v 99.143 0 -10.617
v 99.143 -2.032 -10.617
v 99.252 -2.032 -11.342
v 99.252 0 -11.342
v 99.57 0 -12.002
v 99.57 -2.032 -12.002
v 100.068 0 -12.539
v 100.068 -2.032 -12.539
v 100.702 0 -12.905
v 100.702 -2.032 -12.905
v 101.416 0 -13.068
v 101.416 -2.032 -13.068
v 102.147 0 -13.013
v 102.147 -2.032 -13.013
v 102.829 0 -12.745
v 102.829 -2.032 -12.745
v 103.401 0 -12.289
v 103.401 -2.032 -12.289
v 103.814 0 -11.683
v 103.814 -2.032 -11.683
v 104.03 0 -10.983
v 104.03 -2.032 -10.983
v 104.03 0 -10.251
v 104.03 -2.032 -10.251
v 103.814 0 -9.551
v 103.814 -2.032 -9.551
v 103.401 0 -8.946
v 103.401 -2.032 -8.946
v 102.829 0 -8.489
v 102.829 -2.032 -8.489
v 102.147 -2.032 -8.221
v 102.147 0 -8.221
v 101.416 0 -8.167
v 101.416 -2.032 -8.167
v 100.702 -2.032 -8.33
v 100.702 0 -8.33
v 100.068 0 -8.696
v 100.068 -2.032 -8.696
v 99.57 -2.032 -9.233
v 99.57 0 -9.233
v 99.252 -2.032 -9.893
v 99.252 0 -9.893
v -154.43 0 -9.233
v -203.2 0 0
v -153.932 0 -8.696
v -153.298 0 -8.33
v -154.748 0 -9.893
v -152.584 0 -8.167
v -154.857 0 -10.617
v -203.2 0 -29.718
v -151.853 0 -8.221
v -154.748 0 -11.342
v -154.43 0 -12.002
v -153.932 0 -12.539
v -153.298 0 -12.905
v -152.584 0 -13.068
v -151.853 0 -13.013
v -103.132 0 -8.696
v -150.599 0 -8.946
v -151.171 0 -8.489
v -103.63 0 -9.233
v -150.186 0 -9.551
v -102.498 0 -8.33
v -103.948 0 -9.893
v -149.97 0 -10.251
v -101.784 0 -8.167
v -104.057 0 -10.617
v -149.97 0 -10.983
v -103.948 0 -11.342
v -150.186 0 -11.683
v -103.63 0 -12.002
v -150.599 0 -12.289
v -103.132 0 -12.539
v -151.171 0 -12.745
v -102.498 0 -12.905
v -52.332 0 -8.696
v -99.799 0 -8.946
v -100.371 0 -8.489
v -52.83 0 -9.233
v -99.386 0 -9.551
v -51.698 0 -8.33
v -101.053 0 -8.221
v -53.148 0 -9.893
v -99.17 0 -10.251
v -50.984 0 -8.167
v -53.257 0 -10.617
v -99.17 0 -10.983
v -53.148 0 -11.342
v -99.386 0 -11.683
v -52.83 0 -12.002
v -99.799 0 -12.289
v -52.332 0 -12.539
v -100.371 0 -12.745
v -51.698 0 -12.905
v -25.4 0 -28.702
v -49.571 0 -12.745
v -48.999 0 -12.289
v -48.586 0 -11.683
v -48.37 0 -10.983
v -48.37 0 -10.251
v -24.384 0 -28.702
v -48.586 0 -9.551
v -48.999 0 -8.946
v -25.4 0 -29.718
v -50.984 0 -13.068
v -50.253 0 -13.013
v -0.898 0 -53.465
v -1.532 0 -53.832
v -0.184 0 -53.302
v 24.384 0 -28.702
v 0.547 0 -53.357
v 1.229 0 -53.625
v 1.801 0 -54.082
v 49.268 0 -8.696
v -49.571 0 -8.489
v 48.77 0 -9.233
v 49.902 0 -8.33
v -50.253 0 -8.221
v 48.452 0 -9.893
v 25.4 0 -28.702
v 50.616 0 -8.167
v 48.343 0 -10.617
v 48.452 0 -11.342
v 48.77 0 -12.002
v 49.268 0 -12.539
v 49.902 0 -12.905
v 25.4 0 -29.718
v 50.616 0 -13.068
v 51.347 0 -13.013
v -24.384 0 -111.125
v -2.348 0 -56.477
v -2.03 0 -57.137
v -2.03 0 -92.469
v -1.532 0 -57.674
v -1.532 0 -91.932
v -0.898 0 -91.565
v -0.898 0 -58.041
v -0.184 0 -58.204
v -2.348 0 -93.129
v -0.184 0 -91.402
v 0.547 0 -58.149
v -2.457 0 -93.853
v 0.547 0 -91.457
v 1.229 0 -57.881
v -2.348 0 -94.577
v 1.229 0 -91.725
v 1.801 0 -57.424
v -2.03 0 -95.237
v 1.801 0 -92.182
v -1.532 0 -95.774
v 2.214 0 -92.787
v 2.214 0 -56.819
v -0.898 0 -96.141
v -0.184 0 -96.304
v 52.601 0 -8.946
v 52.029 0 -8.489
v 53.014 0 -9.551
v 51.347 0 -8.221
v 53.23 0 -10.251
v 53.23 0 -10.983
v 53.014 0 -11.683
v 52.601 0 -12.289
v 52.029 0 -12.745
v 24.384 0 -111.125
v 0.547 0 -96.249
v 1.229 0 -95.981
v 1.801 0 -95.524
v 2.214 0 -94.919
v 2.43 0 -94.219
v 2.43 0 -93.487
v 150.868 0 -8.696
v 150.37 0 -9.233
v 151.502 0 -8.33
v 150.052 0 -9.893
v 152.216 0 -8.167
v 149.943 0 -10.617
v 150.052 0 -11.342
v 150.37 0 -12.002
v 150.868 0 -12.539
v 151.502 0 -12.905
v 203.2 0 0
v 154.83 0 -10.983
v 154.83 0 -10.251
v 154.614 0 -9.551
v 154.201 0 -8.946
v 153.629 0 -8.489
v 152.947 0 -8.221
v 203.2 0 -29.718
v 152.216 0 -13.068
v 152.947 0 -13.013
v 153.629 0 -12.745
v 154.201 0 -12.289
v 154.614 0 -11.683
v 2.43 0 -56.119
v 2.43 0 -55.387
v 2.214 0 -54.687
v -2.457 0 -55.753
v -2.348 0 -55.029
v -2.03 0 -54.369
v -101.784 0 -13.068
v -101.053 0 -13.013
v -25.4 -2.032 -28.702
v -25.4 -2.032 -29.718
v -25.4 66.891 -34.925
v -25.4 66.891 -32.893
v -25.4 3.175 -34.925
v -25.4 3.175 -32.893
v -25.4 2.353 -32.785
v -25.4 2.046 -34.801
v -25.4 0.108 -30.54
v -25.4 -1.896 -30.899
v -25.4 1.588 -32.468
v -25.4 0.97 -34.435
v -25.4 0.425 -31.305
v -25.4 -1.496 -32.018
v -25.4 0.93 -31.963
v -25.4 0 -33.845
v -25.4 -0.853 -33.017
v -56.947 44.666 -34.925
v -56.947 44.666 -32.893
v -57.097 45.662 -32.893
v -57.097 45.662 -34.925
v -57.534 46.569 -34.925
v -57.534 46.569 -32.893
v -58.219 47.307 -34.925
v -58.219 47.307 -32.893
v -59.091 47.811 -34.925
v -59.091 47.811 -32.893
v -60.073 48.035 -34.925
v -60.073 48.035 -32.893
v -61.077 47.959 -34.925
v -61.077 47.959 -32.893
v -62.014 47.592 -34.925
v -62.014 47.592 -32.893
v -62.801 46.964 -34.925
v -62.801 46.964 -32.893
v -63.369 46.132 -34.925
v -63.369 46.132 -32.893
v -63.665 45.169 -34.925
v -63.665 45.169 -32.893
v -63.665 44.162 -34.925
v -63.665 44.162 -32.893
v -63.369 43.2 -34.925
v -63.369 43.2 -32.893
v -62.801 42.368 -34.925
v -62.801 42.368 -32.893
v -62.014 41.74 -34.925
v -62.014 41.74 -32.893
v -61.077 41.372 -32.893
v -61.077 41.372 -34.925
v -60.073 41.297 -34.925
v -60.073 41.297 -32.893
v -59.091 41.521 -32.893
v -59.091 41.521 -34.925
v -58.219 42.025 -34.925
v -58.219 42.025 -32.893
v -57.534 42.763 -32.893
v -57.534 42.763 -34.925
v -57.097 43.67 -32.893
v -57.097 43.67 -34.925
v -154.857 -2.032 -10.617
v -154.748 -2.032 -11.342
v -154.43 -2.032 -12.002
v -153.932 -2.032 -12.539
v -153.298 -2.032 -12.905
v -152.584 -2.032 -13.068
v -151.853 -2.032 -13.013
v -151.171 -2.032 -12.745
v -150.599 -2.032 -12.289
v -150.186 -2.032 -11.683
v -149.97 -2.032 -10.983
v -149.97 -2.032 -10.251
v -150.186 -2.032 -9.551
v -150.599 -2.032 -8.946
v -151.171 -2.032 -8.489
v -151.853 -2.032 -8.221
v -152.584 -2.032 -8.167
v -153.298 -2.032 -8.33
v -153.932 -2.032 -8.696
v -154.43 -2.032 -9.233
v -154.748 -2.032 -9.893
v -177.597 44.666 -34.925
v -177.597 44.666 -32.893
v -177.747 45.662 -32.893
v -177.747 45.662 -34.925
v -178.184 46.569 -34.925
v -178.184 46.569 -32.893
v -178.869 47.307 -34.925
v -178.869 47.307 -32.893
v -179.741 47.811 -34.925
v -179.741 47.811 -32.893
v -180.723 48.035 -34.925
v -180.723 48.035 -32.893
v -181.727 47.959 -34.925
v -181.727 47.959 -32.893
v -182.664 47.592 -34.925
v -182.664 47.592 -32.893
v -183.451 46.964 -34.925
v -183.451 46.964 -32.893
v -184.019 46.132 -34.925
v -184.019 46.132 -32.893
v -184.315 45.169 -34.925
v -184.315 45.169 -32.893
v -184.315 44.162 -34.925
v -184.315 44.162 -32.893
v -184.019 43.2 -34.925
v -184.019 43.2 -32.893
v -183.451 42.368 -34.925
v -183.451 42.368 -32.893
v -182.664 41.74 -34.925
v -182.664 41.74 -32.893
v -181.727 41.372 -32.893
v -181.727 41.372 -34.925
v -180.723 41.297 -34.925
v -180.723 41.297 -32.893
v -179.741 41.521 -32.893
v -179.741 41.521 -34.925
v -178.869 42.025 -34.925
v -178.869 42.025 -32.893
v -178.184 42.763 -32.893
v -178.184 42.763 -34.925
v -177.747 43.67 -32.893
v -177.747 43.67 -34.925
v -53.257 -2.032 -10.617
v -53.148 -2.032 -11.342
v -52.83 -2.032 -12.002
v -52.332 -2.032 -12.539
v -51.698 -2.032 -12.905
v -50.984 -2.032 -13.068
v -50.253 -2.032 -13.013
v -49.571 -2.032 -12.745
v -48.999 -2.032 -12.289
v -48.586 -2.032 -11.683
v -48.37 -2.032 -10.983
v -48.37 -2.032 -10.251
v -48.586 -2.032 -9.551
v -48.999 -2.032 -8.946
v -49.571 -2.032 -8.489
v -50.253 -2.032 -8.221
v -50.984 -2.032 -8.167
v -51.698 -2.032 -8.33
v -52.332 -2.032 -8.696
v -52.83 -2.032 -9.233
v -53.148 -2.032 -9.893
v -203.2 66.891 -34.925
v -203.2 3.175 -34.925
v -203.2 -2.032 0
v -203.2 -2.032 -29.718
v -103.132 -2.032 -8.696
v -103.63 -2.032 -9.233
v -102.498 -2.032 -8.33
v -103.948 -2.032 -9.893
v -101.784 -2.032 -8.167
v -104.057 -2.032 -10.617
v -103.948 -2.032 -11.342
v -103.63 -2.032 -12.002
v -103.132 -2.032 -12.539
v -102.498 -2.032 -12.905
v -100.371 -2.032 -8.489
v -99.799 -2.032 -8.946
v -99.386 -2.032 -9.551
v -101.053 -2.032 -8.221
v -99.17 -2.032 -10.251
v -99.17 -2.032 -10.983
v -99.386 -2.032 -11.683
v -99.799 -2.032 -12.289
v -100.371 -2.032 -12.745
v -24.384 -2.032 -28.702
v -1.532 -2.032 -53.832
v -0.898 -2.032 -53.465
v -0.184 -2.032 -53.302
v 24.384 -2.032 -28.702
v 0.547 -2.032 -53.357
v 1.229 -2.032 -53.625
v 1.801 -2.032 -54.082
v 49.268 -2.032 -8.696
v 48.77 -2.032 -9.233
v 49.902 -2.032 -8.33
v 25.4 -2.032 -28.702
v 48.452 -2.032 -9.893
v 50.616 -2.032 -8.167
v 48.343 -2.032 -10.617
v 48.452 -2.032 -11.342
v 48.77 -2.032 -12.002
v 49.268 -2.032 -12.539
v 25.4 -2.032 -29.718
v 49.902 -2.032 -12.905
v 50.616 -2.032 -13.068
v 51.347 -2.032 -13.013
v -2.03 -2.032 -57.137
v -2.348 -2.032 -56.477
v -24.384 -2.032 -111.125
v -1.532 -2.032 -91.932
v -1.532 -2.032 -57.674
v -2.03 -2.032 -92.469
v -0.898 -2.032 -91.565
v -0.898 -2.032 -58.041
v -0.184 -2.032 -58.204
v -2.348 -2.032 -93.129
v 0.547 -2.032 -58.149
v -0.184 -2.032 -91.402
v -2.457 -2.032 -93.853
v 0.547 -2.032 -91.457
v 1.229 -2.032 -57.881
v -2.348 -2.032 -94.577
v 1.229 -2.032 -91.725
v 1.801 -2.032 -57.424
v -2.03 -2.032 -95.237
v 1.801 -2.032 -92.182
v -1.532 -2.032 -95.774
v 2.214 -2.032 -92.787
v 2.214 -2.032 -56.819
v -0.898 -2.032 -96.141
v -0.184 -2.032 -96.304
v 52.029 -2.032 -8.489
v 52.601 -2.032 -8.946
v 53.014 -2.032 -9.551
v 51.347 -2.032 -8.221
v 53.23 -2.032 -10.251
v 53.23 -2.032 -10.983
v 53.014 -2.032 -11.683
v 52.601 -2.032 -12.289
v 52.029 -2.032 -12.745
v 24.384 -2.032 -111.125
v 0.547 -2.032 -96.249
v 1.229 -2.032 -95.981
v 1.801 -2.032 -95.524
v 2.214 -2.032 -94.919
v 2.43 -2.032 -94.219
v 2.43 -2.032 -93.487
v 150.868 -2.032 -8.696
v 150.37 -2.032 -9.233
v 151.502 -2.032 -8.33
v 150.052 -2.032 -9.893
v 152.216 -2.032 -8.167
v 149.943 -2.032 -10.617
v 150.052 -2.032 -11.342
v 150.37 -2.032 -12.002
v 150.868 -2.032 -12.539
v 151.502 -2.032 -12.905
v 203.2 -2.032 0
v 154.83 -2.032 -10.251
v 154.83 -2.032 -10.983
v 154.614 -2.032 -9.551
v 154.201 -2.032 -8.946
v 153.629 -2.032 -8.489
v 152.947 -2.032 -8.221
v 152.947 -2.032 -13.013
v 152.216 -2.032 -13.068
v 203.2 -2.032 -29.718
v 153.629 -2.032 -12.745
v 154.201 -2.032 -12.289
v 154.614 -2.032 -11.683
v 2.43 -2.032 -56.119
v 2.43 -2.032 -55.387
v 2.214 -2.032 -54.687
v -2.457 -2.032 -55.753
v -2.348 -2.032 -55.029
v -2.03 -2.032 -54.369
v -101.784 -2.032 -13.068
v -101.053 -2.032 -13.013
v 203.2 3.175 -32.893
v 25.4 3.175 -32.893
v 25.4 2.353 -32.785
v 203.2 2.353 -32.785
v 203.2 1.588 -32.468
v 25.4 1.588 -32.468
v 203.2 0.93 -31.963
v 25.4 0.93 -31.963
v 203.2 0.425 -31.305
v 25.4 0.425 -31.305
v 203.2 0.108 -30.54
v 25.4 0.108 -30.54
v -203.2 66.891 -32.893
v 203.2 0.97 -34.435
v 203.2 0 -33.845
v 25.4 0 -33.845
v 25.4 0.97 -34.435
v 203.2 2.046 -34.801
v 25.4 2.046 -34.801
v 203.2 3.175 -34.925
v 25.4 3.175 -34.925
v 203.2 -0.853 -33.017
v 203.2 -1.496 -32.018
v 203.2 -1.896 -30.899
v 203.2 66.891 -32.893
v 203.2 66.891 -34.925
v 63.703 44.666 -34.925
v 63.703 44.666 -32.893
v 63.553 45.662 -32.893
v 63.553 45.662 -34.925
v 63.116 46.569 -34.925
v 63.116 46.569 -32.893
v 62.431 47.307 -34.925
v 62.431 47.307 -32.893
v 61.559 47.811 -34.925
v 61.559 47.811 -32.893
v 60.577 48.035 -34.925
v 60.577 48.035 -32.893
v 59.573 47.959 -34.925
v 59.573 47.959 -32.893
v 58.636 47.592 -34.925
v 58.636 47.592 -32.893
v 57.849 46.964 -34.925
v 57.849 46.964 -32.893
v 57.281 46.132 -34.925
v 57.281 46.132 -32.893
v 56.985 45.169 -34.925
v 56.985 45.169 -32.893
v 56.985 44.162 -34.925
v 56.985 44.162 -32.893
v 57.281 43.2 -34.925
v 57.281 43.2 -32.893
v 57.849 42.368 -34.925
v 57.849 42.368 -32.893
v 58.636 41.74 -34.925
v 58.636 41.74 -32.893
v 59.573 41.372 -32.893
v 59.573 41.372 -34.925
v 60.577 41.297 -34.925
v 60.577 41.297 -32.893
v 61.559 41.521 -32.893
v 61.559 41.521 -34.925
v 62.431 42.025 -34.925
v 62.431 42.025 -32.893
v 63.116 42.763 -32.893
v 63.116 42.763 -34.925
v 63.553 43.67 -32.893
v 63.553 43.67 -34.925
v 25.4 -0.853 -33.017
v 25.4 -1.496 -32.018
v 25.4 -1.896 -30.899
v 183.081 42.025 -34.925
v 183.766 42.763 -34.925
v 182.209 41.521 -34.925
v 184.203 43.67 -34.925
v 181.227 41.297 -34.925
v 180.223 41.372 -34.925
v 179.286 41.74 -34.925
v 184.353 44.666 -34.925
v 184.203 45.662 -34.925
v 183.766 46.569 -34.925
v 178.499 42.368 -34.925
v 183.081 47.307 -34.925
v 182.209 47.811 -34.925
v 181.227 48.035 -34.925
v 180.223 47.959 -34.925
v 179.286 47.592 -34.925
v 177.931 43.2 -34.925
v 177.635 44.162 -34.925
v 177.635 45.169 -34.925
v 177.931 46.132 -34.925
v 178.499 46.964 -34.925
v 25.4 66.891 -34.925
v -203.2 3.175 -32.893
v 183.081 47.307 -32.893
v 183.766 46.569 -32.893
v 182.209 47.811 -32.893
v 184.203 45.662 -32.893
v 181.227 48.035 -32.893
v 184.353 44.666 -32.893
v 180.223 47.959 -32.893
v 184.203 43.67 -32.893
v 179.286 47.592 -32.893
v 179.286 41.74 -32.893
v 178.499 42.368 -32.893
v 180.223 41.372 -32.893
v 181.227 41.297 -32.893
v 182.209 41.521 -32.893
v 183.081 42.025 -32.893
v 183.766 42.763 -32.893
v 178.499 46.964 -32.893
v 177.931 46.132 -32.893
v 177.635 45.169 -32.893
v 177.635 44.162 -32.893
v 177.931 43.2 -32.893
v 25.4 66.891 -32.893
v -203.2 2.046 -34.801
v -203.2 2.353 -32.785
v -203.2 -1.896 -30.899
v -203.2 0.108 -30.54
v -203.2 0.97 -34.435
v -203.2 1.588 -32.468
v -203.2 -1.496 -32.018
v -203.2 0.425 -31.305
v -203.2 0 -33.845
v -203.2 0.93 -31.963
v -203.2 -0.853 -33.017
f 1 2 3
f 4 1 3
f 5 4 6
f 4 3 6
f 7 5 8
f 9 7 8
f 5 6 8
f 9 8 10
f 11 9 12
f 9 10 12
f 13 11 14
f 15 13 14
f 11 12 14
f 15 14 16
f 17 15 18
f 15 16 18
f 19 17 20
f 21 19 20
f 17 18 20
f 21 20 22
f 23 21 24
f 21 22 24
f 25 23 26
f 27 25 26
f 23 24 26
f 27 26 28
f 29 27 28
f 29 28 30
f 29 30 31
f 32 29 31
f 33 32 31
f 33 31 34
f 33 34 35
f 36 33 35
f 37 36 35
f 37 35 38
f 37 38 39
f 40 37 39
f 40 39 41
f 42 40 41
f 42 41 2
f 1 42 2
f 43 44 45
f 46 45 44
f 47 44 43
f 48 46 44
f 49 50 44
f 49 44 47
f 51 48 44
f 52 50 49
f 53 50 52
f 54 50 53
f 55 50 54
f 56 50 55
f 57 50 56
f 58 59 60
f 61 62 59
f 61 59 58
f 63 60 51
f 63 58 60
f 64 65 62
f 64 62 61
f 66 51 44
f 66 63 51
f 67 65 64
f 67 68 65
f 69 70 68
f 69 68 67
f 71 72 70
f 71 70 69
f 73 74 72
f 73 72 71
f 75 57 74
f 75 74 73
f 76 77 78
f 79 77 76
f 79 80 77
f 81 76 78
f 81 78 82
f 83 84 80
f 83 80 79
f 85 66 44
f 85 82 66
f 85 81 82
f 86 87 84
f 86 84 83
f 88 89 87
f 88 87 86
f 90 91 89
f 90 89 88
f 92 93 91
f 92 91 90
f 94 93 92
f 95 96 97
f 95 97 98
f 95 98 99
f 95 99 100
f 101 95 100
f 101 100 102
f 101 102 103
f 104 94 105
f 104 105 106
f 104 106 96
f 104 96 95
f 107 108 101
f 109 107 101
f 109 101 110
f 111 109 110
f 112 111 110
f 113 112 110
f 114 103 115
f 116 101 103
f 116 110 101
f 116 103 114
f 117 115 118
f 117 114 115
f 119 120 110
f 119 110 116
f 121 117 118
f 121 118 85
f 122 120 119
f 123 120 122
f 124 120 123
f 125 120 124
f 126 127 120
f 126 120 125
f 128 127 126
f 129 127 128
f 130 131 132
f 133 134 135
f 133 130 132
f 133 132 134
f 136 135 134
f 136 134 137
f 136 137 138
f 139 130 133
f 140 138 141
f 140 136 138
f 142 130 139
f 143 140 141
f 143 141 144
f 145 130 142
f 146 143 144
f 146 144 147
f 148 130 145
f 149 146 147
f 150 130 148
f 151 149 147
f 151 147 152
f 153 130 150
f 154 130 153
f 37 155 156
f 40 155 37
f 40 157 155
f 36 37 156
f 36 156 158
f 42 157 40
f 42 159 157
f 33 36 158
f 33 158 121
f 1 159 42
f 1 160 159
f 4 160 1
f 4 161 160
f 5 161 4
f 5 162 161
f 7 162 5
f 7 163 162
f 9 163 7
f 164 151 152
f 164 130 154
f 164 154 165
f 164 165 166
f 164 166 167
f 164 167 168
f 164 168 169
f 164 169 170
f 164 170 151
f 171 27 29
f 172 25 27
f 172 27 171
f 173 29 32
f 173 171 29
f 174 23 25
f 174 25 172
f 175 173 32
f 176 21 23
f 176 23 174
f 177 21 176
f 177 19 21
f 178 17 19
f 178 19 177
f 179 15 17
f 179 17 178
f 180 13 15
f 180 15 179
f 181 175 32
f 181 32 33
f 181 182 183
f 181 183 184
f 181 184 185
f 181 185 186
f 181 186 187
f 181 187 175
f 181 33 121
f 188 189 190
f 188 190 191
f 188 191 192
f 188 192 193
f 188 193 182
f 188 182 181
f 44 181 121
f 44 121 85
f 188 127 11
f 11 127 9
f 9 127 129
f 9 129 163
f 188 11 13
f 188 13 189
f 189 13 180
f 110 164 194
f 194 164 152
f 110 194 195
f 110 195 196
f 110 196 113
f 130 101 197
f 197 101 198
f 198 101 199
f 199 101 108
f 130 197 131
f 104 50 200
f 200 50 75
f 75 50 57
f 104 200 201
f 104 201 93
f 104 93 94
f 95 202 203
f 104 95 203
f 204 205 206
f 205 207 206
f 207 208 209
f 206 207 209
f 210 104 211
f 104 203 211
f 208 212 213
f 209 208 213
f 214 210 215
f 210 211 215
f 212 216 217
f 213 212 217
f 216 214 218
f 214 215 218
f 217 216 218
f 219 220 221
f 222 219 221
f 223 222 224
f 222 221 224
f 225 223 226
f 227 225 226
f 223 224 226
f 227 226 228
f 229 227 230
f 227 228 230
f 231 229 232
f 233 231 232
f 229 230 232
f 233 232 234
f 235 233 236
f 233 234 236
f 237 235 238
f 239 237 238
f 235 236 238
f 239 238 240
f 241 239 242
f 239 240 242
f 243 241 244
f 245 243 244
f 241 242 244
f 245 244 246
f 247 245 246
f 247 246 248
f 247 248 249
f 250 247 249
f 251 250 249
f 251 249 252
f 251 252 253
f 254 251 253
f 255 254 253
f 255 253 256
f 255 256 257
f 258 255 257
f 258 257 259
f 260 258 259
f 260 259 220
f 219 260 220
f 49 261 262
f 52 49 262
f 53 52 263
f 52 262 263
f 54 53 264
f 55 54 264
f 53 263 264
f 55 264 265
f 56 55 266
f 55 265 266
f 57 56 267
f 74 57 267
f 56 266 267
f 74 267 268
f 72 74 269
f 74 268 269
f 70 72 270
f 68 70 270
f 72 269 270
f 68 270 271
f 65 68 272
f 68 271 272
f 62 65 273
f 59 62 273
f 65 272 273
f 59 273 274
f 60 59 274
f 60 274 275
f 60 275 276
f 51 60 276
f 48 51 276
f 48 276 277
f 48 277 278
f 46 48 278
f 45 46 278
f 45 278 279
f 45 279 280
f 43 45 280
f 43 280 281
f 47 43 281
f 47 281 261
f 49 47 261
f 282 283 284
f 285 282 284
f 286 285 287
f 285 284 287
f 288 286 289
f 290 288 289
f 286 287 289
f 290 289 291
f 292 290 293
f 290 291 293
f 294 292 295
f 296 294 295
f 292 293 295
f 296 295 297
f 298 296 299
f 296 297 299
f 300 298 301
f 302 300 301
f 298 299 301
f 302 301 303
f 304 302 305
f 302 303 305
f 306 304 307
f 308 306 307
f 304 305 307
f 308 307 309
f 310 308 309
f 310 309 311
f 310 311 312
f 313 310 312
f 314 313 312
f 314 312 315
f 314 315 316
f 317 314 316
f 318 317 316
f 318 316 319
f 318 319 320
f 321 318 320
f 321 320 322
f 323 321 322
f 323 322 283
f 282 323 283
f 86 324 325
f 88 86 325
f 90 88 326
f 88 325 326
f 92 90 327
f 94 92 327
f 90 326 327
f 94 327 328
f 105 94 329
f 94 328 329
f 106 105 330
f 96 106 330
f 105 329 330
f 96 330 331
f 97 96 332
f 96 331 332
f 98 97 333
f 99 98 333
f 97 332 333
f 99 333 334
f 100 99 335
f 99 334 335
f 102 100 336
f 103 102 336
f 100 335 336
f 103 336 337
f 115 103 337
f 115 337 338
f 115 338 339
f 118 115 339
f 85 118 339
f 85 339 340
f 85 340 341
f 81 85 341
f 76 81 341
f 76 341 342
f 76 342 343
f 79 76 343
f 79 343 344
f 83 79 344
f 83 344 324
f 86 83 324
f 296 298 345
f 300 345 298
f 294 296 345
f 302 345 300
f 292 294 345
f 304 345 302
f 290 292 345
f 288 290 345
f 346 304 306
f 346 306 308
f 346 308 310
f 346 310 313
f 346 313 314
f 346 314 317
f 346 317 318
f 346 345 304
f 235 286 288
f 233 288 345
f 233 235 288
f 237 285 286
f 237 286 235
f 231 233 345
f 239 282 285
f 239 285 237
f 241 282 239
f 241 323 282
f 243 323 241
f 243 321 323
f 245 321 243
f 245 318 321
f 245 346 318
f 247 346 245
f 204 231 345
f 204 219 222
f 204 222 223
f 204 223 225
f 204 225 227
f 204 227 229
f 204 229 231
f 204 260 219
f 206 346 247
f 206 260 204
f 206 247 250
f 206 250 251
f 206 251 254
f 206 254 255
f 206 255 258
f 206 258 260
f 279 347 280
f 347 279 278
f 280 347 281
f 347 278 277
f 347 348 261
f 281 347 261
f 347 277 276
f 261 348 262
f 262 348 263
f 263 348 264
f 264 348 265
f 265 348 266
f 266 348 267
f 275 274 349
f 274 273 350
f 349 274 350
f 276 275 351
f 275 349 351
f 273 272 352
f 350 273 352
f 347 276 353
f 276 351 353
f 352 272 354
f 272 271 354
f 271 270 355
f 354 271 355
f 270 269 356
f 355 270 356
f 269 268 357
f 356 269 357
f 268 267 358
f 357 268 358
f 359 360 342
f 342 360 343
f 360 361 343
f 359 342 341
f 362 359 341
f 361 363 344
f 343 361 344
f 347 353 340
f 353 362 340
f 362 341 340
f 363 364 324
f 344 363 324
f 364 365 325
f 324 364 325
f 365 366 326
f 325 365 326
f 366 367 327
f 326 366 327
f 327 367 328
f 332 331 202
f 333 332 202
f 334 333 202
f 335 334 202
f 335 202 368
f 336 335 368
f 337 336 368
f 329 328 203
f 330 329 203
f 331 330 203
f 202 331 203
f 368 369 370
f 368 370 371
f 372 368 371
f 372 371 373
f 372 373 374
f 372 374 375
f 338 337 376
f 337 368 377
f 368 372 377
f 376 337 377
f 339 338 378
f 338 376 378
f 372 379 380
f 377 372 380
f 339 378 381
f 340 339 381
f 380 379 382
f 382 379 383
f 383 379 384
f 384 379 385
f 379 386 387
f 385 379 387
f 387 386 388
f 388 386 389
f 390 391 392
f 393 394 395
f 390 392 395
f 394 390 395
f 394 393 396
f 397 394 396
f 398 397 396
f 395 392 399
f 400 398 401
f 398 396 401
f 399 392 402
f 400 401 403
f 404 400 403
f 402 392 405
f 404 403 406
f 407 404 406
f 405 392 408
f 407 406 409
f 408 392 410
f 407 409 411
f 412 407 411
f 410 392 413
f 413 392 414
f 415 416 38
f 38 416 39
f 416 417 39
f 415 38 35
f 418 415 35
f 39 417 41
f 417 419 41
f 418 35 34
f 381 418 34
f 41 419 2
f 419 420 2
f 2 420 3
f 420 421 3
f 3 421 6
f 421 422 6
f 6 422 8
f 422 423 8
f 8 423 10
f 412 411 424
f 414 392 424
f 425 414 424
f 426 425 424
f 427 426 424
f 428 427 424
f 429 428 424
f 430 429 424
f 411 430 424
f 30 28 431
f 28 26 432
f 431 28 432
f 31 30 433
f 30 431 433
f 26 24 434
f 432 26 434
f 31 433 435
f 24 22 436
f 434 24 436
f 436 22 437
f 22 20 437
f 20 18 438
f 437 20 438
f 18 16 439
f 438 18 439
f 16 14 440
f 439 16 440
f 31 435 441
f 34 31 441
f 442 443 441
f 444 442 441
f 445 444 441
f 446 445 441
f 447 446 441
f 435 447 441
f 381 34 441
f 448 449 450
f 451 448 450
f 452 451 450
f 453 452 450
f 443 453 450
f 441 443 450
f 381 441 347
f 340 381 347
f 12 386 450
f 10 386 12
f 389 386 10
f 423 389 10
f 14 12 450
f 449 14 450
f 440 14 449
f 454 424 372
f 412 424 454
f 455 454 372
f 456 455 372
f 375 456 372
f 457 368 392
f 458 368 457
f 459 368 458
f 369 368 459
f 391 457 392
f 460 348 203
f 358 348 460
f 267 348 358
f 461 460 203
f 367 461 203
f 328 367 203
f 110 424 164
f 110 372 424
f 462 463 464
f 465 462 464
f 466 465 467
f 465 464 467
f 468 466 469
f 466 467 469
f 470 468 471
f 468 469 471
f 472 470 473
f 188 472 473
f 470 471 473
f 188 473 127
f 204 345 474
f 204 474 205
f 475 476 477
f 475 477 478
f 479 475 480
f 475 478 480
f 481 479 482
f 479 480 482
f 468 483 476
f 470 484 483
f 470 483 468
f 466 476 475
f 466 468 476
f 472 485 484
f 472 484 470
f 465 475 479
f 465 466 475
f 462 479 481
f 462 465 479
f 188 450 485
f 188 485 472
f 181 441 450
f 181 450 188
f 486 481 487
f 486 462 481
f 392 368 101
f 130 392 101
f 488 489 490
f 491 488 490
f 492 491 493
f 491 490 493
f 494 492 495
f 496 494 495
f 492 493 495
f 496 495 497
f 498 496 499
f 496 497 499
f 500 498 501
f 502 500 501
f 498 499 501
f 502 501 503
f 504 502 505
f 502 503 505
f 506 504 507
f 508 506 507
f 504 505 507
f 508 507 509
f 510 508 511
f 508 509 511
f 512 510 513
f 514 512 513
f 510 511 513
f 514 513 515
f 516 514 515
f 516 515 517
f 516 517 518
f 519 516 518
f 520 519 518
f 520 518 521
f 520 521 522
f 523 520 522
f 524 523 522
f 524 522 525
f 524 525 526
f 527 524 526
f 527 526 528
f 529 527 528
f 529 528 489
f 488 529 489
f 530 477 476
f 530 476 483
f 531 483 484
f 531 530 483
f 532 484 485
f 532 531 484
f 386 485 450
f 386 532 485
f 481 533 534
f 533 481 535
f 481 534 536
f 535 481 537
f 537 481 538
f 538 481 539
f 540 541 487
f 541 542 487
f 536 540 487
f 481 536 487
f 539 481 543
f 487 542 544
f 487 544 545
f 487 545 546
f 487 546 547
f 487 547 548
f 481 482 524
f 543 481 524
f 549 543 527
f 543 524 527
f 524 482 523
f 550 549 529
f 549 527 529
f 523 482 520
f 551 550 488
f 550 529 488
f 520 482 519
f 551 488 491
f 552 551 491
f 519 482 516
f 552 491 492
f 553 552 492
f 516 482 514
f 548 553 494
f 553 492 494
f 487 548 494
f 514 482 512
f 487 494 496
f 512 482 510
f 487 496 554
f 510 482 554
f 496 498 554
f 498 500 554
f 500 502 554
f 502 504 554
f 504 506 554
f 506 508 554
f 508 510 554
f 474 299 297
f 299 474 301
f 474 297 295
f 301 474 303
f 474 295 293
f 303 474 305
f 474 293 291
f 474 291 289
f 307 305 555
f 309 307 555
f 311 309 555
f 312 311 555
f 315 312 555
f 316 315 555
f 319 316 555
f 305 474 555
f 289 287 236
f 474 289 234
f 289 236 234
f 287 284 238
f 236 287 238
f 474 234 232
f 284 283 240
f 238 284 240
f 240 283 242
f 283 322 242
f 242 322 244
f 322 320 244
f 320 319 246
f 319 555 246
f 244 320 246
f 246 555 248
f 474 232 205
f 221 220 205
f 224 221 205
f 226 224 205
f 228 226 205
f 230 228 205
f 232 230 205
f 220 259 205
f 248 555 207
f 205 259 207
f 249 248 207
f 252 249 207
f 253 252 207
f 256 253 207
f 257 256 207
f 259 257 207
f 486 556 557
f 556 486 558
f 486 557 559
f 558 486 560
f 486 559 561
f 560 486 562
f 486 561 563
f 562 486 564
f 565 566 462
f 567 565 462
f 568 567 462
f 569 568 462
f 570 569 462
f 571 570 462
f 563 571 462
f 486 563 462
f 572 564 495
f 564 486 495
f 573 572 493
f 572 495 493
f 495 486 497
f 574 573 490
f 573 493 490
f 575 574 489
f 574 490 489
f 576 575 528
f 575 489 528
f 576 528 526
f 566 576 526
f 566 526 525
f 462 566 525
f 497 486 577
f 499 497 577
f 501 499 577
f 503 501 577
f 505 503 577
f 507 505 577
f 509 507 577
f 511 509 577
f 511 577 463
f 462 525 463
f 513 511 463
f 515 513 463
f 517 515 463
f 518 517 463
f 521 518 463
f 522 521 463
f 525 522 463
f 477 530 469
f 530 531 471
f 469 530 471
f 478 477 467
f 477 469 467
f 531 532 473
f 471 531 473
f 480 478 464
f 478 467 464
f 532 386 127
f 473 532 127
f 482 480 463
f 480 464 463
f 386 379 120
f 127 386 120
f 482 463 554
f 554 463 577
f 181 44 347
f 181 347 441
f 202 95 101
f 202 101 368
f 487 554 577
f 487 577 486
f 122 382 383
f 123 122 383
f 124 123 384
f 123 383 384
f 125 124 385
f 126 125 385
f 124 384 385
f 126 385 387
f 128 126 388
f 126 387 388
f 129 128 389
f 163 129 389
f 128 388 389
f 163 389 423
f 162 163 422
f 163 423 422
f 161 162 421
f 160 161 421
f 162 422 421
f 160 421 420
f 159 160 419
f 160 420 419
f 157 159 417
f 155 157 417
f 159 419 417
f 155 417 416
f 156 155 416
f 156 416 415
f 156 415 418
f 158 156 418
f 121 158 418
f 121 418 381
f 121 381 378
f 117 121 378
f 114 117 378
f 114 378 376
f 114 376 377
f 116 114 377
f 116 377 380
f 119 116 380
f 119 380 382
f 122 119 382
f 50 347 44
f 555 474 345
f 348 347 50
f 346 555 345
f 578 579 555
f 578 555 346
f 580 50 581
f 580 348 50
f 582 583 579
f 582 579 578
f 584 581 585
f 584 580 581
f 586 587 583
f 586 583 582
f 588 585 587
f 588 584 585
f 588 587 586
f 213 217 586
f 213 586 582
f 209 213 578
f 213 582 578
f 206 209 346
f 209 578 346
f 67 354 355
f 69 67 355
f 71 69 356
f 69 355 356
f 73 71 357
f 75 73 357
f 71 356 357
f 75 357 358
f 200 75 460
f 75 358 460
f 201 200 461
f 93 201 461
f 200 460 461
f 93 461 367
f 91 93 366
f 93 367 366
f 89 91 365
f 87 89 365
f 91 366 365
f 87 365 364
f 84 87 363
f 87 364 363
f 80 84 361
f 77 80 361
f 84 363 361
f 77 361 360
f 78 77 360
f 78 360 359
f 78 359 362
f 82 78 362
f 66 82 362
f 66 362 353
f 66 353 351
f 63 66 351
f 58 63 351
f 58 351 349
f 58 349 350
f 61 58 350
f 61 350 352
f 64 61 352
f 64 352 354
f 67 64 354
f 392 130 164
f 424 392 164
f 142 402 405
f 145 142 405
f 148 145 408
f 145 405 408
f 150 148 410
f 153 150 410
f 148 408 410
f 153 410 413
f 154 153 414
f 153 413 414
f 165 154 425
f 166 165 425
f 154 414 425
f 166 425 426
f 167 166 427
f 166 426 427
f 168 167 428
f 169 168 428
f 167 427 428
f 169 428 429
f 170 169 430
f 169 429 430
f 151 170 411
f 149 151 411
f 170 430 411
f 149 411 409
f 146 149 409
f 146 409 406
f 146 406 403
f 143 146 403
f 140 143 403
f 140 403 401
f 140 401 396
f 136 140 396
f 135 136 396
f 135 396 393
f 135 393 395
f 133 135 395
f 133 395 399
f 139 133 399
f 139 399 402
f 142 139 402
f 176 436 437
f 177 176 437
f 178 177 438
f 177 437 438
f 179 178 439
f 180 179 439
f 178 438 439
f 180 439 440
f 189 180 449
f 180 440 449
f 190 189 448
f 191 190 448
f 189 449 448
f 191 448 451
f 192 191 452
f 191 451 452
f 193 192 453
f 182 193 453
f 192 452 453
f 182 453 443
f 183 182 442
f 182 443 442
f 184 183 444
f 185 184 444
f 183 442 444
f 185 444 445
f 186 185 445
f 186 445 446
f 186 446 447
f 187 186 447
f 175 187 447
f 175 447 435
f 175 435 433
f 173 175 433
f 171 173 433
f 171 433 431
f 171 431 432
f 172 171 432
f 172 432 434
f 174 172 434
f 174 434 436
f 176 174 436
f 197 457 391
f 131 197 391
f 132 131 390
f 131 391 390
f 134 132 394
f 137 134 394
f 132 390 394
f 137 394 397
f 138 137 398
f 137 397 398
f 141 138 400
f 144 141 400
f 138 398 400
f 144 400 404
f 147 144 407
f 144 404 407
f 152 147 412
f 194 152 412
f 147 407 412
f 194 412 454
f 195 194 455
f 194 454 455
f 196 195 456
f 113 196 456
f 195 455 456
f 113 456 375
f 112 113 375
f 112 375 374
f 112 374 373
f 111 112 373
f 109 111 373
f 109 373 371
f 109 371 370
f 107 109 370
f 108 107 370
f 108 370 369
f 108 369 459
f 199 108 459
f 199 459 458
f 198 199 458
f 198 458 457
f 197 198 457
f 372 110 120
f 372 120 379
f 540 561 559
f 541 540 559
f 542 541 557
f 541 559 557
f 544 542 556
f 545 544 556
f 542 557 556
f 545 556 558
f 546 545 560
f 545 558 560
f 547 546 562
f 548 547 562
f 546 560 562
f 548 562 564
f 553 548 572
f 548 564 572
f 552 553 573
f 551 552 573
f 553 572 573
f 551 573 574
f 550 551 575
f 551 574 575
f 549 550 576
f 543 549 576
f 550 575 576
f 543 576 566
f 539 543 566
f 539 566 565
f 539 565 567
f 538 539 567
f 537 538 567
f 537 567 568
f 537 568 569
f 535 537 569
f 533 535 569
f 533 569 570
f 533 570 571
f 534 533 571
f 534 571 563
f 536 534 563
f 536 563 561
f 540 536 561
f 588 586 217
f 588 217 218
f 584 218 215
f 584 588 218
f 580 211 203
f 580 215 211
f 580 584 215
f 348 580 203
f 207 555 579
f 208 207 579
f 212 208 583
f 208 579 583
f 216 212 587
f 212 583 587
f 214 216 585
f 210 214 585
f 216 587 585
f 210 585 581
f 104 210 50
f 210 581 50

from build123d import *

# Parameters (mm, degrees)
SKETCH1_W                    = 406.4
SKETCH1_H                    = 111.125
BASE_FLANGE1_DEPTH           = 2.032
EDGE_FLANGE2_START           = -203.2
EDGE_FLANGE2_DEPTH           = 178.816
EDGE_FLANGE2_START_2         = -25.4
EDGE_FLANGE2_2_DEPTH         = 1.016
EDGE_FLANGE2_3_DEPTH         = 177.8
EDGE_FLANGE3_START           = 24.384
EDGE_FLANGE3_DEPTH           = 178.816
EDGE_FLANGE3_2_DEPTH         = 1.016
EDGE_FLANGE3_START_2         = 25.4
EDGE_FLANGE3_3_DEPTH         = 177.8
SKETCH24_W                   = 177.8
SKETCH24_H                   = 2.032
BOSS_EXTRUDE1_DEPTH          = 5.4229
F_10_0_1935_DIAMETER_HOLE1_D = 4.9149
F_1_4_CLEARANCE_HOLE1_D      = 6.7564


# Read off the part's stored shape, not the designer's step: Edge-Flange2, Edge-Flange3
# Sheet-metal steps are written as plain solids
with BuildPart() as part:
    # Sketch1 → Base-Flange1 (new body)
    with BuildSketch(Plane(origin=(0, 0, 0), x_dir=(1, 0, 0), z_dir=(0, 1, 0))):
        with Locations((0, 55.5625)):
            Rectangle(SKETCH1_W, SKETCH1_H)
    extrude(amount=-BASE_FLANGE1_DEPTH)

    # Edge-Flange2 outline → Edge-Flange2 (cut)
    with BuildSketch(Plane.YZ.offset(EDGE_FLANGE2_START)):
        with BuildLine():
            ThreePointArc((0, -33.84501151), (-1.496459836, -32.018067825), (-2.032, -29.718))
            Line((-2.032, -29.718), (-2.032, -111.125))
            Line((-2.032, -111.125), (0, -111.125))
            Line((0, -111.125), (0, -33.84501151))
        make_face()
    extrude(amount=EDGE_FLANGE2_DEPTH, mode=Mode.SUBTRACT)

    # Edge-Flange2 2 outline → Edge-Flange2 2 (cut)
    with BuildSketch(Plane.YZ.offset(EDGE_FLANGE2_START_2)):
        with BuildLine():
            Line((0, -28.702), (-2.032, -28.702))
            Line((-2.032, -28.702), (-2.032, -29.718))
            ThreePointArc((-2.032, -29.718), (-1.496459836, -32.018067825), (0, -33.84501151))
            Line((0, -33.84501151), (0, -28.702))
        make_face()
    extrude(amount=EDGE_FLANGE2_2_DEPTH, mode=Mode.SUBTRACT)

    # Edge-Flange2 3 outline → Edge-Flange2 3 (add)
    with BuildSketch(Plane.YZ.offset(EDGE_FLANGE2_START)):
        with BuildLine():
            ThreePointArc((3.175, -32.893), (0.92993597, -31.96306403), (0, -29.718))
            Line((0, -29.718), (0, -33.84501151))
            ThreePointArc((0, -33.84501151), (1.498172628, -34.647614485), (3.175, -34.925))
            Line((3.175, -34.925), (61.468, -34.925))
            Line((61.468, -34.925), (61.468, -32.893))
            Line((61.468, -32.893), (3.175, -32.893))
        make_face()
    extrude(amount=EDGE_FLANGE2_3_DEPTH)

    # Edge-Flange3 outline → Edge-Flange3 (cut)
    with BuildSketch(Plane.YZ.offset(EDGE_FLANGE3_START)):
        with BuildLine():
            ThreePointArc((0, -33.84501151), (-1.496459836, -32.018067825), (-2.032, -29.718))
            Line((-2.032, -29.718), (-2.032, -111.125))
            Line((-2.032, -111.125), (0, -111.125))
            Line((0, -111.125), (0, -33.84501151))
        make_face()
    extrude(amount=EDGE_FLANGE3_DEPTH, mode=Mode.SUBTRACT)

    # Edge-Flange3 2 outline → Edge-Flange3 2 (cut)
    with BuildSketch(Plane.YZ.offset(EDGE_FLANGE3_START)):
        with BuildLine():
            Line((0, -28.702), (-2.032, -28.702))
            Line((-2.032, -28.702), (-2.032, -29.718))
            ThreePointArc((-2.032, -29.718), (-1.496459836, -32.018067825), (0, -33.84501151))
            Line((0, -33.84501151), (0, -28.702))
        make_face()
    extrude(amount=EDGE_FLANGE3_2_DEPTH, mode=Mode.SUBTRACT)

    # Edge-Flange3 3 outline → Edge-Flange3 3 (add)
    with BuildSketch(Plane.YZ.offset(EDGE_FLANGE3_START_2)):
        with BuildLine():
            ThreePointArc((3.175, -32.893), (0.92993597, -31.96306403), (0, -29.718))
            Line((0, -29.718), (0, -33.84501151))
            ThreePointArc((0, -33.84501151), (1.498172628, -34.647614485), (3.175, -34.925))
            Line((3.175, -34.925), (61.468, -34.925))
            Line((61.468, -34.925), (61.468, -32.893))
            Line((61.468, -32.893), (3.175, -32.893))
        make_face()
    extrude(amount=EDGE_FLANGE3_3_DEPTH)

    # Sketch24 → Boss-Extrude1 (add)
    with BuildSketch(Plane(origin=(0, 61.468, 0), x_dir=(1, 0, 0), z_dir=(0, 1, 0))):
        with Locations((-114.3, 33.909)):
            Rectangle(SKETCH24_W, SKETCH24_H)
        with Locations((114.3, 33.909)):
            Rectangle(SKETCH24_W, SKETCH24_H)
    extrude(amount=BOSS_EXTRUDE1_DEPTH)

    # #10 (0.1935) Diameter Hole1 (through all)
    with Locations(Plane(origin=(0, 0, 0), x_dir=(1, 0, 0), z_dir=(0, 1, 0))):
        with Locations((0, 93.853), (0, 55.753), (-152.4, 10.6172), (-50.8, 10.6172), (152.4, 10.6172), (50.8, 10.6172), (101.6, 10.6172), (-101.6, 10.6172)):
            Hole(F_10_0_1935_DIAMETER_HOLE1_D / 2)

    # 1/4 Clearance Hole1 (through all)
    with Locations(Plane(origin=(0, 0, -34.925), x_dir=(-1, 0, 0), z_dir=(0, 0, -1))):
        with Locations((180.975, 44.6659), (60.325, 44.6659), (-180.975, 44.6659), (-60.325, 44.6659)):
            Hole(F_1_4_CLEARANCE_HOLE1_D / 2)


solid = part.part
